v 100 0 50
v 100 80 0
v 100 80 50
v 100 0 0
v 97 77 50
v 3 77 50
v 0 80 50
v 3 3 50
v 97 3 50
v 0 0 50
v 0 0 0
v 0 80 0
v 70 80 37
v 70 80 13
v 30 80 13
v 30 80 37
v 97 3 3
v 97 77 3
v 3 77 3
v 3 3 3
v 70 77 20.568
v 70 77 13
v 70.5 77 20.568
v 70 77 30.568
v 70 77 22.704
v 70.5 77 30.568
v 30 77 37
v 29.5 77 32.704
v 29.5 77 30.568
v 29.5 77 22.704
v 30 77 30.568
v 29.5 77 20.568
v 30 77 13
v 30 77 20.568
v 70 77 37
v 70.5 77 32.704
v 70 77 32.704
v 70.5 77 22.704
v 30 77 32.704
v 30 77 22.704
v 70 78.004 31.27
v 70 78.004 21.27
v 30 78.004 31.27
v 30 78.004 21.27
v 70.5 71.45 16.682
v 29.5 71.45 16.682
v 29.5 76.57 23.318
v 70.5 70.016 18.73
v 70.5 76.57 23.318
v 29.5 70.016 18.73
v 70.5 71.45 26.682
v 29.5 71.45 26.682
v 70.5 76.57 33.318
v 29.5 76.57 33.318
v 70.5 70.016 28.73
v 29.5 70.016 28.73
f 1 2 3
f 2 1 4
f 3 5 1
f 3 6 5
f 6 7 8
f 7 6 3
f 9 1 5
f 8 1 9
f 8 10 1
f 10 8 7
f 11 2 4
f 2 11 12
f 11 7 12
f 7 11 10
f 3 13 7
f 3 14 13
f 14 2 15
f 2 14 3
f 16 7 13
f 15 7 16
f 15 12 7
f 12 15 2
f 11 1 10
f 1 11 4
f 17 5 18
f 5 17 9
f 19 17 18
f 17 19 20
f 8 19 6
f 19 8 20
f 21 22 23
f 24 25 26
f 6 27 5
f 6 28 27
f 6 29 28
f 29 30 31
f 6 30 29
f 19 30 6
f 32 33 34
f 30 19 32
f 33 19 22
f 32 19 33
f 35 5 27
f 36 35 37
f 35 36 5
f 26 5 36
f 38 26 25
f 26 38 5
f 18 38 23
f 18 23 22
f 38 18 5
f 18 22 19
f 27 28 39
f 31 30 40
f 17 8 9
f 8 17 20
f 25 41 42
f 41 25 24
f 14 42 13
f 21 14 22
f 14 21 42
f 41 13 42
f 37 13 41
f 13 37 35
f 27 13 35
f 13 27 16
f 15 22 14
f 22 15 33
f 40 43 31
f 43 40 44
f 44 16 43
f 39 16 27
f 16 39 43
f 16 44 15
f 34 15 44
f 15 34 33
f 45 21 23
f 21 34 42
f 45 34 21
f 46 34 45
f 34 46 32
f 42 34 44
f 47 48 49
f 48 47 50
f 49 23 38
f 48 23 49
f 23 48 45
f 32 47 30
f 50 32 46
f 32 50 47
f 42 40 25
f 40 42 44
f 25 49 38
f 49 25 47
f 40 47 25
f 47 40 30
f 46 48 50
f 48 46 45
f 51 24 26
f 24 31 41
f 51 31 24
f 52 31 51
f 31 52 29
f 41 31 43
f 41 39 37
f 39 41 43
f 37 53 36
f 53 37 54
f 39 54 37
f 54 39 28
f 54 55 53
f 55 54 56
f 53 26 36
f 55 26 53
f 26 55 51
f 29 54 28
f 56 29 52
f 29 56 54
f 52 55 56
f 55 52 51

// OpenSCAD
$fn = 32;

// ----------------------------------------------------------------------
// Vent box: louvers enclosure
// ----------------------------------------------------------------------

// --- parameters (mm) ---
box_l = 100;              // box length, X
box_w = 80;               // box width, Y
box_h = 50;               // box height, Z
wall_t = 3;               // shell wall thickness
win_l = 40;               // vent window width, X
win_h = 24;               // vent window height, Z
slat_t = 2.5;             // louver slat thickness
slat_d = 8;               // louver slat depth
slat_a = 35;              // louver slat angle, degrees
slat_pitch = 10;          // louver pitch
slat_yc = 74.01;          // slat centreline Y

win_z0 = (box_h - win_h) / 2;  // window lower edge Z
n_slats = 2;  // louver count
slat_z0 = win_z0 + (win_h - (n_slats - 1) * slat_pitch) / 2;

difference() {
  union() {
    difference() {
      cube([box_l, box_w, box_h]);
  translate([wall_t, wall_t, wall_t])
    cube([box_l - 2 * wall_t, box_w - 2 * wall_t, box_h]);
  translate([(box_l - win_l) / 2, box_w - wall_t - 1, win_z0])
    cube([win_l, wall_t + 2, win_h]);
    }
    for (i = [0 : n_slats - 1])
      translate([box_l / 2, slat_yc, slat_z0 + i * slat_pitch])
        rotate([slat_a, 0, 0])
          cube([win_l + 1, slat_d, slat_t], center = true);
  }
}
